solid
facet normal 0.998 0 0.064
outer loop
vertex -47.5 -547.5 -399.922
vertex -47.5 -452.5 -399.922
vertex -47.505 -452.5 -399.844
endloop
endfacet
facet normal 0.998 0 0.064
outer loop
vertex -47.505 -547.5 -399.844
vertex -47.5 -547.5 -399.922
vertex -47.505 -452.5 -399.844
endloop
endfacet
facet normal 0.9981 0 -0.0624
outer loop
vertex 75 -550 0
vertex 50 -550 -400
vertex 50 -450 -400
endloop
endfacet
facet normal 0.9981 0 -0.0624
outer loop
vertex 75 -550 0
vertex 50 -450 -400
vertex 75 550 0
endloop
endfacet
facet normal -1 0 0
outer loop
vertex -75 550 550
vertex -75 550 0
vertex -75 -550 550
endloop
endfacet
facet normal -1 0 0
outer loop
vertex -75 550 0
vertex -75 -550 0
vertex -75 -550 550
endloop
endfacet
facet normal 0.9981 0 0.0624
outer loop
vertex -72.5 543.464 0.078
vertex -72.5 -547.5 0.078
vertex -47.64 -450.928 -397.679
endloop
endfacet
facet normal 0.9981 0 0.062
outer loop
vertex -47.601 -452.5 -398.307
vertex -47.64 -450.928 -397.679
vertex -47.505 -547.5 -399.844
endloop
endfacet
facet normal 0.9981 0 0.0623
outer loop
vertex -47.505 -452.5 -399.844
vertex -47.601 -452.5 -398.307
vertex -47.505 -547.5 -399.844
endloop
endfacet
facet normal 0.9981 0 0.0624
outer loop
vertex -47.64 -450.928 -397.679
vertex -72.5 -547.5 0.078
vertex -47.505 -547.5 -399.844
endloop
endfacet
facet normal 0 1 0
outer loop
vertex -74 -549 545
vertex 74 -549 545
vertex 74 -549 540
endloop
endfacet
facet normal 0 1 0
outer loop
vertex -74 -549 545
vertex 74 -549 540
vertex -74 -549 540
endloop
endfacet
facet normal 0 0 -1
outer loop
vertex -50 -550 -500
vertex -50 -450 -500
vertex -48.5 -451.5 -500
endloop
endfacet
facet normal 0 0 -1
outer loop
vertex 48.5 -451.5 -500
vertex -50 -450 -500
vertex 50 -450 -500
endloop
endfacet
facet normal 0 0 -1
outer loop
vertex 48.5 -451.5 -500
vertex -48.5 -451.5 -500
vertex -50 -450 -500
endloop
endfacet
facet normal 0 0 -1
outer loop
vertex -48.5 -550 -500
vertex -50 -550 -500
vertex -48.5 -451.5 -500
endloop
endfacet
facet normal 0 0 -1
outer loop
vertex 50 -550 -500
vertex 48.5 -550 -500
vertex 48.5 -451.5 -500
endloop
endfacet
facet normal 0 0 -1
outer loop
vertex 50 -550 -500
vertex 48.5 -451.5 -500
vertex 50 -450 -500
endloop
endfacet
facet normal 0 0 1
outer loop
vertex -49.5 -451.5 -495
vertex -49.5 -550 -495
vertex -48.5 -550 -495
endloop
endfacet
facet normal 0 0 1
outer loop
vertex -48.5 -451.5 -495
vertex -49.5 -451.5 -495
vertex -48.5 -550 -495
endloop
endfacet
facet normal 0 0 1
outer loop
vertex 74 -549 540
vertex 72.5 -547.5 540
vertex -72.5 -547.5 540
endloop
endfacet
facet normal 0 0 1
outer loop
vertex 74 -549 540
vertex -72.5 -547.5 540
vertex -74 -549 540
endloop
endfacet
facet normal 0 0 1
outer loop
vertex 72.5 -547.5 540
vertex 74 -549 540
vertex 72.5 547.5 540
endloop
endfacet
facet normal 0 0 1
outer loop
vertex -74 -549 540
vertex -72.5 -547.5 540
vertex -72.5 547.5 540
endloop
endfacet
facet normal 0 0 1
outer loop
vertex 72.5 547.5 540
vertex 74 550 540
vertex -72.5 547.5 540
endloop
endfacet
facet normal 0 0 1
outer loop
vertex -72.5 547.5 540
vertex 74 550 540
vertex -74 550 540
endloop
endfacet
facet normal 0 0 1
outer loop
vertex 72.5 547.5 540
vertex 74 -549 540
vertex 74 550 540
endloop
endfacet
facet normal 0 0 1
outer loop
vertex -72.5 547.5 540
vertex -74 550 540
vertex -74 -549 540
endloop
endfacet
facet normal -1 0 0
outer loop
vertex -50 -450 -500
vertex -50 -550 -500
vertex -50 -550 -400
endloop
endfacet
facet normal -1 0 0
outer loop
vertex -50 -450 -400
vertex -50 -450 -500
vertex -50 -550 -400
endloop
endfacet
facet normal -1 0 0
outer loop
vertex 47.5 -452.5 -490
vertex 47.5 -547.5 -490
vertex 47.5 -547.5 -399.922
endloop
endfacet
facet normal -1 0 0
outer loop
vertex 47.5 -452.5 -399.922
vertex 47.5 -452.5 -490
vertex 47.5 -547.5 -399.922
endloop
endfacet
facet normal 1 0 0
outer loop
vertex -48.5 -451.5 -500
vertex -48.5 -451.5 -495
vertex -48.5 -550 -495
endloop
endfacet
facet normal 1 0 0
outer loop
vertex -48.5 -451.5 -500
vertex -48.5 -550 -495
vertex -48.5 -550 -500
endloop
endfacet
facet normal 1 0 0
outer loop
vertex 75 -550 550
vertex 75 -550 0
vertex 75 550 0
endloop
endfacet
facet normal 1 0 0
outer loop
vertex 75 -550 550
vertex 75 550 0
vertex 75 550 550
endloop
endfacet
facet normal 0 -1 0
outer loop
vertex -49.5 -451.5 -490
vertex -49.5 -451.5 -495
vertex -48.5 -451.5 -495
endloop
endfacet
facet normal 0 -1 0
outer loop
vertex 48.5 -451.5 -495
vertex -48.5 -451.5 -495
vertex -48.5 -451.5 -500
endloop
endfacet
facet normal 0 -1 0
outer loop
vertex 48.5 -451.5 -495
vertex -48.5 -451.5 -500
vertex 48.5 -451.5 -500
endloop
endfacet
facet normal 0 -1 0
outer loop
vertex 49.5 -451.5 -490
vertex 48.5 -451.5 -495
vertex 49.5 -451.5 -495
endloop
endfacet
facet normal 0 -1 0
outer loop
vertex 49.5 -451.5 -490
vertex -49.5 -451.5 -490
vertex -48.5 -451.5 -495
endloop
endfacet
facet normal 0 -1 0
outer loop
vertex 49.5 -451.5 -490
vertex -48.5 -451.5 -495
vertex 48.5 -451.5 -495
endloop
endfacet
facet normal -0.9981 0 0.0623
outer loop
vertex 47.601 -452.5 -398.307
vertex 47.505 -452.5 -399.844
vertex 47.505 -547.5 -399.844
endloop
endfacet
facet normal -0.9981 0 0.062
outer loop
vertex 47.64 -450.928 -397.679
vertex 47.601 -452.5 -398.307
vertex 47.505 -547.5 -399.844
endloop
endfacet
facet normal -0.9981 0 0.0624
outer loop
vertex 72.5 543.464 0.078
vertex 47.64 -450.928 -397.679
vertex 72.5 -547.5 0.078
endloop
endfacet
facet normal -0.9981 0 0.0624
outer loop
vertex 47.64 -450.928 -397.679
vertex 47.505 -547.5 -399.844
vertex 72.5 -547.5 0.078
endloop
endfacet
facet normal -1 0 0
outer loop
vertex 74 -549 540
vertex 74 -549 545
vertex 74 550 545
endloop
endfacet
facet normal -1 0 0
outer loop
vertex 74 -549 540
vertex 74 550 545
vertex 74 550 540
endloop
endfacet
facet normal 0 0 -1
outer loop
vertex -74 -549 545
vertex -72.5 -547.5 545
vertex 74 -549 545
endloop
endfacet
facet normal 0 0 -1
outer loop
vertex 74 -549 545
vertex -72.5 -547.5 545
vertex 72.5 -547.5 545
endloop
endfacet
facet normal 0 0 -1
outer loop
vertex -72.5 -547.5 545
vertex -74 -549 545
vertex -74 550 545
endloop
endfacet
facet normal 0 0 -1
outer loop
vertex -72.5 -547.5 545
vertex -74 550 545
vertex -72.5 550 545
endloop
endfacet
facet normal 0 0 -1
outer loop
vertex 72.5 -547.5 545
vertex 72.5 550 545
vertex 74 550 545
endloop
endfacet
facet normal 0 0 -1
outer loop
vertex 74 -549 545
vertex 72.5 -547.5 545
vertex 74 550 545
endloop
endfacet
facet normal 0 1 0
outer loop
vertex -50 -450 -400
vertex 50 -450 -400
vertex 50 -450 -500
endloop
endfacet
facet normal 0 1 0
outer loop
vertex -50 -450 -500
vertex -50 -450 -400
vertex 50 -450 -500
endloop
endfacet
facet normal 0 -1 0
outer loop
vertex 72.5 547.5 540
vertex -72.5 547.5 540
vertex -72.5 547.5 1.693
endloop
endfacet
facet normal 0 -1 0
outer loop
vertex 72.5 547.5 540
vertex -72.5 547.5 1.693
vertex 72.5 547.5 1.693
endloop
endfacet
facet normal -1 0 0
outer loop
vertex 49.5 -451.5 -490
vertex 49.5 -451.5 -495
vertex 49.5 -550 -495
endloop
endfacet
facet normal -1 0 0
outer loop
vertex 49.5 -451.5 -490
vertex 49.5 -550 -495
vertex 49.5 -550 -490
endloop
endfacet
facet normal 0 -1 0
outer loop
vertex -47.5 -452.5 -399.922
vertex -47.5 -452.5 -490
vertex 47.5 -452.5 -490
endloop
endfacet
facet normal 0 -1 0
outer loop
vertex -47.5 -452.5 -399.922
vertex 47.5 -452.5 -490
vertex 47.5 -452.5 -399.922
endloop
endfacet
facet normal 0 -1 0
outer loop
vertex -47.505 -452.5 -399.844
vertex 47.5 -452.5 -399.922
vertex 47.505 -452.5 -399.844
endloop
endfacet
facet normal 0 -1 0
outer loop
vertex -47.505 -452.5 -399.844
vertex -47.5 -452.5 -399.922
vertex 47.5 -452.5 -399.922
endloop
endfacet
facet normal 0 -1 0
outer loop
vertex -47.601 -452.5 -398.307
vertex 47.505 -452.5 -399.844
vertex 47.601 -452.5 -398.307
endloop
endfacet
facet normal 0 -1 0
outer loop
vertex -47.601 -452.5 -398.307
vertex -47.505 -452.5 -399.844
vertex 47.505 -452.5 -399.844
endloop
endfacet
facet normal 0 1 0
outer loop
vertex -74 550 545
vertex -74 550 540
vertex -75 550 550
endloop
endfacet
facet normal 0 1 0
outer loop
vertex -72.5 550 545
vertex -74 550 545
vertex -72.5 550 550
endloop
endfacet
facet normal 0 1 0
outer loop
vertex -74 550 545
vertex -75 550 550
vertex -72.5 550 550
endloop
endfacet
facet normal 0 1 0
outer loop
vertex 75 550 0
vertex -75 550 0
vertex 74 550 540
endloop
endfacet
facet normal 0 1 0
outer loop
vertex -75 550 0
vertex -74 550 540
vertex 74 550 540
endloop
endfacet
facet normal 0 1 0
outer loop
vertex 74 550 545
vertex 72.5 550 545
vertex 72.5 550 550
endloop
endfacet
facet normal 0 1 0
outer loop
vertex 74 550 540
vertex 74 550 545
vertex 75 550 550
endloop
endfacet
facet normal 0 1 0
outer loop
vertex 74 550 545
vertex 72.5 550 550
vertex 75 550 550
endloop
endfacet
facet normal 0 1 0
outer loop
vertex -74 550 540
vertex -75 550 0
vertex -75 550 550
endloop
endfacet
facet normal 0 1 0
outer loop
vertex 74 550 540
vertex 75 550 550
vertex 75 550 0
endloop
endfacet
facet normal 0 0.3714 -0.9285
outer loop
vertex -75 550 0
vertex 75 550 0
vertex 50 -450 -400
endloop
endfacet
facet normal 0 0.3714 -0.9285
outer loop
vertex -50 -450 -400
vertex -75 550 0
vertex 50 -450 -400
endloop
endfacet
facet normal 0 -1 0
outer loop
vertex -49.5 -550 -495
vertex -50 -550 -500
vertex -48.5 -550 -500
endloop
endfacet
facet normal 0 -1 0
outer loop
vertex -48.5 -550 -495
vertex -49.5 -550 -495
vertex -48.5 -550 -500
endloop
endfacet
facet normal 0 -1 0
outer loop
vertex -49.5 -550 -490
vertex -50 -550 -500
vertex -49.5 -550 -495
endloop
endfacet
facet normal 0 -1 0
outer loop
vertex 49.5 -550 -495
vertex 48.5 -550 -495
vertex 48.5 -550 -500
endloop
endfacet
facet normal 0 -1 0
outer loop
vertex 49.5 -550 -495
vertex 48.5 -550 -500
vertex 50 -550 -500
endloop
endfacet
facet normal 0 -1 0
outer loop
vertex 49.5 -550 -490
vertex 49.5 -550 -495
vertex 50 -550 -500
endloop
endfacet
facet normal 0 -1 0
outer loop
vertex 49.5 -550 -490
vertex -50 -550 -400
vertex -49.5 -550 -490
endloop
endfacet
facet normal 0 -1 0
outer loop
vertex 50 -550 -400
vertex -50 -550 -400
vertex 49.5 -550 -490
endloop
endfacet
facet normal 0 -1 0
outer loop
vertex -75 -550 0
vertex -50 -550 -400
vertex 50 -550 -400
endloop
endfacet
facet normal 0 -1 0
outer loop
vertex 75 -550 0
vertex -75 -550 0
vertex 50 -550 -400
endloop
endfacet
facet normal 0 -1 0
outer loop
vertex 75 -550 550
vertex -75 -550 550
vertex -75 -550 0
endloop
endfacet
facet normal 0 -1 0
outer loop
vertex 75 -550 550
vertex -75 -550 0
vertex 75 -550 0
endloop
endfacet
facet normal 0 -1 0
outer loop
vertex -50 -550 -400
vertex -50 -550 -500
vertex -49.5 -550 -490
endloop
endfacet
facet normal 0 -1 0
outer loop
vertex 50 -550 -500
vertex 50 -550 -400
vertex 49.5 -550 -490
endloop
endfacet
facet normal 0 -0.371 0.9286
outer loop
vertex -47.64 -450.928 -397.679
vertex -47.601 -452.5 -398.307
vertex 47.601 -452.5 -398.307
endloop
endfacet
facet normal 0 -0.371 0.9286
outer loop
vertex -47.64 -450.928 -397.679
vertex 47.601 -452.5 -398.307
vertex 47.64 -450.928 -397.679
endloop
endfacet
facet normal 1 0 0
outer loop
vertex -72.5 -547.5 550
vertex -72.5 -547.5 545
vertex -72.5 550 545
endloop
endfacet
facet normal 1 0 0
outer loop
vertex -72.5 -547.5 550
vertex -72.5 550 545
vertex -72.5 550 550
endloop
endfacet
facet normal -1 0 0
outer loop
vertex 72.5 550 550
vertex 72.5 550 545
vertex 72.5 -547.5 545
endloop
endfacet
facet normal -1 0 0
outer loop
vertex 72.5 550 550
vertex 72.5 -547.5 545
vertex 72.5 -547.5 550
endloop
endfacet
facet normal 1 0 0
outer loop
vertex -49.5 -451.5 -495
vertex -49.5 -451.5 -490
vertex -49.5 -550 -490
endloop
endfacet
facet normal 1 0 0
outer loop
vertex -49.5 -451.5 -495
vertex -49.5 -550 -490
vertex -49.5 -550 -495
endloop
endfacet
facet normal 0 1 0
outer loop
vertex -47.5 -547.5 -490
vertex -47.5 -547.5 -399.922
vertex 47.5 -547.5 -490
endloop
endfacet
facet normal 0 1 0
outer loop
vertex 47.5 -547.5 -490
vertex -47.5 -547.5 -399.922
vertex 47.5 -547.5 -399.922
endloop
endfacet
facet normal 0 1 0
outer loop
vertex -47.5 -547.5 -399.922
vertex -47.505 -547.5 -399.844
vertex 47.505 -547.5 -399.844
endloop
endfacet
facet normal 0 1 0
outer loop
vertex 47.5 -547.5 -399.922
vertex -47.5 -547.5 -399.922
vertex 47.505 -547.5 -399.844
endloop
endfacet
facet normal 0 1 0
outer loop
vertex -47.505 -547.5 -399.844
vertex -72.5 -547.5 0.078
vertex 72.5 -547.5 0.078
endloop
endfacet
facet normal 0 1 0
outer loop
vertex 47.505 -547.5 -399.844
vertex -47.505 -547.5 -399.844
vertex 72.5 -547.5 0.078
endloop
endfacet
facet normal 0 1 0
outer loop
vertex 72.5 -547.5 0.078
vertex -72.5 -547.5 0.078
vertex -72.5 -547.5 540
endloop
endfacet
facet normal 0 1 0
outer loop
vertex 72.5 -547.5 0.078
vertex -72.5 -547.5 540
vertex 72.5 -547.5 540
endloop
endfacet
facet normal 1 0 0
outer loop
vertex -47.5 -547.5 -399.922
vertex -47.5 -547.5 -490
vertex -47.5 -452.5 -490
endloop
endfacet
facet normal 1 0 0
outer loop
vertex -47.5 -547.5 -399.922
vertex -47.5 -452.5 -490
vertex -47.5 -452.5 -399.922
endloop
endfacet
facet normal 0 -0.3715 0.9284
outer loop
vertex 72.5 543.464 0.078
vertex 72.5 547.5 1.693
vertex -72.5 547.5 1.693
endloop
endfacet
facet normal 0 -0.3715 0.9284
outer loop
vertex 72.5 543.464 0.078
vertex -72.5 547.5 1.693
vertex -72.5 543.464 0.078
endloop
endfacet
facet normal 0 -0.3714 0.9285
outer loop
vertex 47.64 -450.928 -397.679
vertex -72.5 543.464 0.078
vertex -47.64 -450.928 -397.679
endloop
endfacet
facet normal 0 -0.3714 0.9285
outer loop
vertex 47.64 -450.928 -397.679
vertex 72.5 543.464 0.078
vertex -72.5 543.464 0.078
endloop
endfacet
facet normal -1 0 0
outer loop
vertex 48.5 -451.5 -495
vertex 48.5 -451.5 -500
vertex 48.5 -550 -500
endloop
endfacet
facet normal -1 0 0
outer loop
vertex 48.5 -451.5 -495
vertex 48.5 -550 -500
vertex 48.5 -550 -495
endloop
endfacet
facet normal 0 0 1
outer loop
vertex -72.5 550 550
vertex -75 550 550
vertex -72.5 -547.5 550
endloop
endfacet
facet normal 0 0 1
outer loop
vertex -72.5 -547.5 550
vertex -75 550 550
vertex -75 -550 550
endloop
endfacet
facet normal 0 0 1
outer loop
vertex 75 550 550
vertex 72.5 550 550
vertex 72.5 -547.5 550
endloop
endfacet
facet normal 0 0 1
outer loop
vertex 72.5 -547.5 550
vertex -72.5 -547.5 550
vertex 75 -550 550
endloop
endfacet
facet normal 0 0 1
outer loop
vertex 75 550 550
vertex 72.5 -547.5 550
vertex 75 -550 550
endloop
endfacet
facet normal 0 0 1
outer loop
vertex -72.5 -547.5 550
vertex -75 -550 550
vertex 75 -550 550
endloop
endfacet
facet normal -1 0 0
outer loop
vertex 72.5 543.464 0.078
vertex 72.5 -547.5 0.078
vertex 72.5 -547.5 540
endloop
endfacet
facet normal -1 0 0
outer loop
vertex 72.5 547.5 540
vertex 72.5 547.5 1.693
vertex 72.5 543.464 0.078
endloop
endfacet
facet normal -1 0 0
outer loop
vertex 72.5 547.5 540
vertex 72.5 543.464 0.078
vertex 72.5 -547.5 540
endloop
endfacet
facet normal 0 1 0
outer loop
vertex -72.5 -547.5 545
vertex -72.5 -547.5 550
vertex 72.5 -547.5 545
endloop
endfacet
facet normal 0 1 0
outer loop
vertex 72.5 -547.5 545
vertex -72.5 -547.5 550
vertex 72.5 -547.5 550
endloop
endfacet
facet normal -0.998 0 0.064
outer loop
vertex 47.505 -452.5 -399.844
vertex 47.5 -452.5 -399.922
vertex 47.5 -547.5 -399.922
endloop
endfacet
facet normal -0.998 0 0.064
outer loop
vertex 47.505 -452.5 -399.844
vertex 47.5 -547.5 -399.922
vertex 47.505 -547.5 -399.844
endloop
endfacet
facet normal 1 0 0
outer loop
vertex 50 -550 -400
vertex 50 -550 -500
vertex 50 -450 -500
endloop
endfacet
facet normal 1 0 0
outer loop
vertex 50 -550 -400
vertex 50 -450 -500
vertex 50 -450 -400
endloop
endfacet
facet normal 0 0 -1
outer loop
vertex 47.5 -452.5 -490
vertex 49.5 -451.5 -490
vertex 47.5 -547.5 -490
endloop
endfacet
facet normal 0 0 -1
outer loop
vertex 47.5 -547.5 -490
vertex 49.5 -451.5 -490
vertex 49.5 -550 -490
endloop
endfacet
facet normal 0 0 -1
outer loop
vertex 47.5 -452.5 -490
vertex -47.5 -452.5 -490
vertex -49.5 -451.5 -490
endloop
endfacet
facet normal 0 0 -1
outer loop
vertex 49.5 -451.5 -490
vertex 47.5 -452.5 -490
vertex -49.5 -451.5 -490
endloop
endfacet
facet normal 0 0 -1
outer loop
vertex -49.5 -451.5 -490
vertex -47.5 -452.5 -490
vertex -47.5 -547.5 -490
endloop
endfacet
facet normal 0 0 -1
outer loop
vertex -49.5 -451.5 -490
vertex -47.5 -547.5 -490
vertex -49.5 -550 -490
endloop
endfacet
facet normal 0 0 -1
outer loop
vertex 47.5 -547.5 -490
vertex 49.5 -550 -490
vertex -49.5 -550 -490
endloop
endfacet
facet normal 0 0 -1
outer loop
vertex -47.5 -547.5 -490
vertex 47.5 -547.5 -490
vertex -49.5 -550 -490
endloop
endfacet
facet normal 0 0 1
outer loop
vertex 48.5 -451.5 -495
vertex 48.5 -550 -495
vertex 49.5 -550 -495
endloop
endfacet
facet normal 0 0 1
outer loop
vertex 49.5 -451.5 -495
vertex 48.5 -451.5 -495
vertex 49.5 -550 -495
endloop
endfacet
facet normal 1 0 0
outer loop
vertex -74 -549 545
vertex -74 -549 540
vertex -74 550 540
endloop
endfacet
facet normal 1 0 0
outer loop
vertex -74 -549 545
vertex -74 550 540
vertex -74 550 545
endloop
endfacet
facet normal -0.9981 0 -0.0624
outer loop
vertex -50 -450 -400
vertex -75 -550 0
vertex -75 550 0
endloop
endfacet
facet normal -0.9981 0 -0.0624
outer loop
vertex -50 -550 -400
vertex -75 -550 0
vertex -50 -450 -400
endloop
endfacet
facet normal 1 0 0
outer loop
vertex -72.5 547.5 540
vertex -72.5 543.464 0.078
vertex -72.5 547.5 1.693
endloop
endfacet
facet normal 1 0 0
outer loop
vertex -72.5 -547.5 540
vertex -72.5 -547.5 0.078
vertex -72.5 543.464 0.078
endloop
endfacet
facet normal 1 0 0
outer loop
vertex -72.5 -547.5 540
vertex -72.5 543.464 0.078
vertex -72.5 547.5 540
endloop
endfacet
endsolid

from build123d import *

# Parameters (mm, degrees)
F0_W        = 100
F0_H        = 100
F0_W_2      = 150
F0_H_2      = 550
F1_DEPTH    = 550
F3_DEPTH    = 150
F4_T        = 2.5
F4_T3_DEPTH = 105
F4_T5_DEPTH = 105
F6_DEPTH    = 98.5
F7_W        = 145
F7_H        = 5
F8_DEPTH    = 2.5
F9_DEPTH    = 1099


# Not quite as in the source:
# - a shell that OpenCascade refuses in one call is made with other operations: the cavity is built on its own and cut out


with BuildPart() as f1:
    # F0 (on Front) → F1 (new body, symmetric)
    with BuildSketch(Plane.XZ):
        with Locations((0, -450)):
            Rectangle(F0_W, F0_H)
        with Locations((0, 275)):
            Rectangle(F0_W_2, F0_H_2)
        Polygon((75, 0), (-75, 0), (-50, -400), (50, -400), align=None)
    extrude(amount=F1_DEPTH, both=True)

    # F2 (on face) → F3 (cut)
    with BuildSketch(Plane.YZ.offset(75)):
        Polygon((550, -500), (550, 0), (-450, -400), (-450, -500), align=None)
    extrude(amount=-F3_DEPTH, mode=Mode.SUBTRACT)

    # F4: shell of thickness 2.5, made by hand


with BuildPart() as f4_core1:
    # F4_t2: copy of F1
    add(f1.part)

    # the walls: a layer under each face that stays
    f4_faces = [f4_core1.faces().sort_by_distance(p)[0] for p in [
        (-50, -500, -450),
        (-62.5, 0, -200),
        (0, -550, 25),
        (0, -450, -450),
        (-75, 0, 275),
        (0, 50, -200),
        (50, -500, -450),
        (62.5, 0, -200),
        (75, 0, 275),
        (0, 550, 275),
    ]]
    thicken(f4_faces, amount=-F4_T, mode=Mode.SUBTRACT)

    # F4_s4 → F4_t3 (cut)
    with BuildSketch(Plane.XZ.offset(447.5)):
        Polygon((-50.0499513145, -400.0015594572), (-47.5, -400), (-47.5, -399.9219511453), (-47.5048685538, -399.8440542846), align=None)
        Polygon((50.0499513145, -400.0015594572), (47.5, -400), (47.5, -399.9219511453), (47.5048685538, -399.8440542846), align=None)
    extrude(amount=F4_T3_DEPTH, mode=Mode.SUBTRACT)

    # F4_s6 → F4_t5 (cut)
    with BuildSketch(Plane.YZ.offset(-52.5)):
        Polygon((-449.9657152331, -400.0232119173), (-452.5, -400), (-452.5, -398.3074175964), (-450.9284766909, -397.6788082728), align=None)
    extrude(amount=F4_T5_DEPTH, mode=Mode.SUBTRACT)


with BuildPart() as f1_1:
    add(f1.part)

    # what is left inside the walls is the cavity
    f4_cavity = [f4_core1.part.solids().sort_by_distance(p)[0] for p in [
        (-72.475, 182.5, 275.039024),
    ]]
    add(f4_cavity, mode=Mode.SUBTRACT)

    # F5 (on face) → F6 (cut)
    with BuildSketch(Plane.XZ.offset(550)):
        Polygon((-48.5, -495), (-48.5, -500), (48.5, -500), (48.5, -495), (49.5, -495), (49.5, -490), (-49.5, -490), (-49.5, -495), align=None)
    extrude(amount=-F6_DEPTH, mode=Mode.SUBTRACT)

    # F7 (on face) → F8 (cut)
    with BuildSketch(Plane(origin=(0, 550, 0), x_dir=(-1, 0, 0), z_dir=(0, 1, 0))):
        with Locations((0, 547.5)):
            Rectangle(F7_W, F7_H)
    extrude(amount=-F8_DEPTH, mode=Mode.SUBTRACT)

    # F7 (on face) → F9 (cut)
    with BuildSketch(Plane(origin=(0, 550, 0), x_dir=(-1, 0, 0), z_dir=(0, 1, 0))):
        Polygon((-74, 545), (-74, 540), (74, 540), (74, 545), (72.5, 545), (-72.5, 545), align=None)
    extrude(amount=-F9_DEPTH, mode=Mode.SUBTRACT)


solid = f1_1.part
